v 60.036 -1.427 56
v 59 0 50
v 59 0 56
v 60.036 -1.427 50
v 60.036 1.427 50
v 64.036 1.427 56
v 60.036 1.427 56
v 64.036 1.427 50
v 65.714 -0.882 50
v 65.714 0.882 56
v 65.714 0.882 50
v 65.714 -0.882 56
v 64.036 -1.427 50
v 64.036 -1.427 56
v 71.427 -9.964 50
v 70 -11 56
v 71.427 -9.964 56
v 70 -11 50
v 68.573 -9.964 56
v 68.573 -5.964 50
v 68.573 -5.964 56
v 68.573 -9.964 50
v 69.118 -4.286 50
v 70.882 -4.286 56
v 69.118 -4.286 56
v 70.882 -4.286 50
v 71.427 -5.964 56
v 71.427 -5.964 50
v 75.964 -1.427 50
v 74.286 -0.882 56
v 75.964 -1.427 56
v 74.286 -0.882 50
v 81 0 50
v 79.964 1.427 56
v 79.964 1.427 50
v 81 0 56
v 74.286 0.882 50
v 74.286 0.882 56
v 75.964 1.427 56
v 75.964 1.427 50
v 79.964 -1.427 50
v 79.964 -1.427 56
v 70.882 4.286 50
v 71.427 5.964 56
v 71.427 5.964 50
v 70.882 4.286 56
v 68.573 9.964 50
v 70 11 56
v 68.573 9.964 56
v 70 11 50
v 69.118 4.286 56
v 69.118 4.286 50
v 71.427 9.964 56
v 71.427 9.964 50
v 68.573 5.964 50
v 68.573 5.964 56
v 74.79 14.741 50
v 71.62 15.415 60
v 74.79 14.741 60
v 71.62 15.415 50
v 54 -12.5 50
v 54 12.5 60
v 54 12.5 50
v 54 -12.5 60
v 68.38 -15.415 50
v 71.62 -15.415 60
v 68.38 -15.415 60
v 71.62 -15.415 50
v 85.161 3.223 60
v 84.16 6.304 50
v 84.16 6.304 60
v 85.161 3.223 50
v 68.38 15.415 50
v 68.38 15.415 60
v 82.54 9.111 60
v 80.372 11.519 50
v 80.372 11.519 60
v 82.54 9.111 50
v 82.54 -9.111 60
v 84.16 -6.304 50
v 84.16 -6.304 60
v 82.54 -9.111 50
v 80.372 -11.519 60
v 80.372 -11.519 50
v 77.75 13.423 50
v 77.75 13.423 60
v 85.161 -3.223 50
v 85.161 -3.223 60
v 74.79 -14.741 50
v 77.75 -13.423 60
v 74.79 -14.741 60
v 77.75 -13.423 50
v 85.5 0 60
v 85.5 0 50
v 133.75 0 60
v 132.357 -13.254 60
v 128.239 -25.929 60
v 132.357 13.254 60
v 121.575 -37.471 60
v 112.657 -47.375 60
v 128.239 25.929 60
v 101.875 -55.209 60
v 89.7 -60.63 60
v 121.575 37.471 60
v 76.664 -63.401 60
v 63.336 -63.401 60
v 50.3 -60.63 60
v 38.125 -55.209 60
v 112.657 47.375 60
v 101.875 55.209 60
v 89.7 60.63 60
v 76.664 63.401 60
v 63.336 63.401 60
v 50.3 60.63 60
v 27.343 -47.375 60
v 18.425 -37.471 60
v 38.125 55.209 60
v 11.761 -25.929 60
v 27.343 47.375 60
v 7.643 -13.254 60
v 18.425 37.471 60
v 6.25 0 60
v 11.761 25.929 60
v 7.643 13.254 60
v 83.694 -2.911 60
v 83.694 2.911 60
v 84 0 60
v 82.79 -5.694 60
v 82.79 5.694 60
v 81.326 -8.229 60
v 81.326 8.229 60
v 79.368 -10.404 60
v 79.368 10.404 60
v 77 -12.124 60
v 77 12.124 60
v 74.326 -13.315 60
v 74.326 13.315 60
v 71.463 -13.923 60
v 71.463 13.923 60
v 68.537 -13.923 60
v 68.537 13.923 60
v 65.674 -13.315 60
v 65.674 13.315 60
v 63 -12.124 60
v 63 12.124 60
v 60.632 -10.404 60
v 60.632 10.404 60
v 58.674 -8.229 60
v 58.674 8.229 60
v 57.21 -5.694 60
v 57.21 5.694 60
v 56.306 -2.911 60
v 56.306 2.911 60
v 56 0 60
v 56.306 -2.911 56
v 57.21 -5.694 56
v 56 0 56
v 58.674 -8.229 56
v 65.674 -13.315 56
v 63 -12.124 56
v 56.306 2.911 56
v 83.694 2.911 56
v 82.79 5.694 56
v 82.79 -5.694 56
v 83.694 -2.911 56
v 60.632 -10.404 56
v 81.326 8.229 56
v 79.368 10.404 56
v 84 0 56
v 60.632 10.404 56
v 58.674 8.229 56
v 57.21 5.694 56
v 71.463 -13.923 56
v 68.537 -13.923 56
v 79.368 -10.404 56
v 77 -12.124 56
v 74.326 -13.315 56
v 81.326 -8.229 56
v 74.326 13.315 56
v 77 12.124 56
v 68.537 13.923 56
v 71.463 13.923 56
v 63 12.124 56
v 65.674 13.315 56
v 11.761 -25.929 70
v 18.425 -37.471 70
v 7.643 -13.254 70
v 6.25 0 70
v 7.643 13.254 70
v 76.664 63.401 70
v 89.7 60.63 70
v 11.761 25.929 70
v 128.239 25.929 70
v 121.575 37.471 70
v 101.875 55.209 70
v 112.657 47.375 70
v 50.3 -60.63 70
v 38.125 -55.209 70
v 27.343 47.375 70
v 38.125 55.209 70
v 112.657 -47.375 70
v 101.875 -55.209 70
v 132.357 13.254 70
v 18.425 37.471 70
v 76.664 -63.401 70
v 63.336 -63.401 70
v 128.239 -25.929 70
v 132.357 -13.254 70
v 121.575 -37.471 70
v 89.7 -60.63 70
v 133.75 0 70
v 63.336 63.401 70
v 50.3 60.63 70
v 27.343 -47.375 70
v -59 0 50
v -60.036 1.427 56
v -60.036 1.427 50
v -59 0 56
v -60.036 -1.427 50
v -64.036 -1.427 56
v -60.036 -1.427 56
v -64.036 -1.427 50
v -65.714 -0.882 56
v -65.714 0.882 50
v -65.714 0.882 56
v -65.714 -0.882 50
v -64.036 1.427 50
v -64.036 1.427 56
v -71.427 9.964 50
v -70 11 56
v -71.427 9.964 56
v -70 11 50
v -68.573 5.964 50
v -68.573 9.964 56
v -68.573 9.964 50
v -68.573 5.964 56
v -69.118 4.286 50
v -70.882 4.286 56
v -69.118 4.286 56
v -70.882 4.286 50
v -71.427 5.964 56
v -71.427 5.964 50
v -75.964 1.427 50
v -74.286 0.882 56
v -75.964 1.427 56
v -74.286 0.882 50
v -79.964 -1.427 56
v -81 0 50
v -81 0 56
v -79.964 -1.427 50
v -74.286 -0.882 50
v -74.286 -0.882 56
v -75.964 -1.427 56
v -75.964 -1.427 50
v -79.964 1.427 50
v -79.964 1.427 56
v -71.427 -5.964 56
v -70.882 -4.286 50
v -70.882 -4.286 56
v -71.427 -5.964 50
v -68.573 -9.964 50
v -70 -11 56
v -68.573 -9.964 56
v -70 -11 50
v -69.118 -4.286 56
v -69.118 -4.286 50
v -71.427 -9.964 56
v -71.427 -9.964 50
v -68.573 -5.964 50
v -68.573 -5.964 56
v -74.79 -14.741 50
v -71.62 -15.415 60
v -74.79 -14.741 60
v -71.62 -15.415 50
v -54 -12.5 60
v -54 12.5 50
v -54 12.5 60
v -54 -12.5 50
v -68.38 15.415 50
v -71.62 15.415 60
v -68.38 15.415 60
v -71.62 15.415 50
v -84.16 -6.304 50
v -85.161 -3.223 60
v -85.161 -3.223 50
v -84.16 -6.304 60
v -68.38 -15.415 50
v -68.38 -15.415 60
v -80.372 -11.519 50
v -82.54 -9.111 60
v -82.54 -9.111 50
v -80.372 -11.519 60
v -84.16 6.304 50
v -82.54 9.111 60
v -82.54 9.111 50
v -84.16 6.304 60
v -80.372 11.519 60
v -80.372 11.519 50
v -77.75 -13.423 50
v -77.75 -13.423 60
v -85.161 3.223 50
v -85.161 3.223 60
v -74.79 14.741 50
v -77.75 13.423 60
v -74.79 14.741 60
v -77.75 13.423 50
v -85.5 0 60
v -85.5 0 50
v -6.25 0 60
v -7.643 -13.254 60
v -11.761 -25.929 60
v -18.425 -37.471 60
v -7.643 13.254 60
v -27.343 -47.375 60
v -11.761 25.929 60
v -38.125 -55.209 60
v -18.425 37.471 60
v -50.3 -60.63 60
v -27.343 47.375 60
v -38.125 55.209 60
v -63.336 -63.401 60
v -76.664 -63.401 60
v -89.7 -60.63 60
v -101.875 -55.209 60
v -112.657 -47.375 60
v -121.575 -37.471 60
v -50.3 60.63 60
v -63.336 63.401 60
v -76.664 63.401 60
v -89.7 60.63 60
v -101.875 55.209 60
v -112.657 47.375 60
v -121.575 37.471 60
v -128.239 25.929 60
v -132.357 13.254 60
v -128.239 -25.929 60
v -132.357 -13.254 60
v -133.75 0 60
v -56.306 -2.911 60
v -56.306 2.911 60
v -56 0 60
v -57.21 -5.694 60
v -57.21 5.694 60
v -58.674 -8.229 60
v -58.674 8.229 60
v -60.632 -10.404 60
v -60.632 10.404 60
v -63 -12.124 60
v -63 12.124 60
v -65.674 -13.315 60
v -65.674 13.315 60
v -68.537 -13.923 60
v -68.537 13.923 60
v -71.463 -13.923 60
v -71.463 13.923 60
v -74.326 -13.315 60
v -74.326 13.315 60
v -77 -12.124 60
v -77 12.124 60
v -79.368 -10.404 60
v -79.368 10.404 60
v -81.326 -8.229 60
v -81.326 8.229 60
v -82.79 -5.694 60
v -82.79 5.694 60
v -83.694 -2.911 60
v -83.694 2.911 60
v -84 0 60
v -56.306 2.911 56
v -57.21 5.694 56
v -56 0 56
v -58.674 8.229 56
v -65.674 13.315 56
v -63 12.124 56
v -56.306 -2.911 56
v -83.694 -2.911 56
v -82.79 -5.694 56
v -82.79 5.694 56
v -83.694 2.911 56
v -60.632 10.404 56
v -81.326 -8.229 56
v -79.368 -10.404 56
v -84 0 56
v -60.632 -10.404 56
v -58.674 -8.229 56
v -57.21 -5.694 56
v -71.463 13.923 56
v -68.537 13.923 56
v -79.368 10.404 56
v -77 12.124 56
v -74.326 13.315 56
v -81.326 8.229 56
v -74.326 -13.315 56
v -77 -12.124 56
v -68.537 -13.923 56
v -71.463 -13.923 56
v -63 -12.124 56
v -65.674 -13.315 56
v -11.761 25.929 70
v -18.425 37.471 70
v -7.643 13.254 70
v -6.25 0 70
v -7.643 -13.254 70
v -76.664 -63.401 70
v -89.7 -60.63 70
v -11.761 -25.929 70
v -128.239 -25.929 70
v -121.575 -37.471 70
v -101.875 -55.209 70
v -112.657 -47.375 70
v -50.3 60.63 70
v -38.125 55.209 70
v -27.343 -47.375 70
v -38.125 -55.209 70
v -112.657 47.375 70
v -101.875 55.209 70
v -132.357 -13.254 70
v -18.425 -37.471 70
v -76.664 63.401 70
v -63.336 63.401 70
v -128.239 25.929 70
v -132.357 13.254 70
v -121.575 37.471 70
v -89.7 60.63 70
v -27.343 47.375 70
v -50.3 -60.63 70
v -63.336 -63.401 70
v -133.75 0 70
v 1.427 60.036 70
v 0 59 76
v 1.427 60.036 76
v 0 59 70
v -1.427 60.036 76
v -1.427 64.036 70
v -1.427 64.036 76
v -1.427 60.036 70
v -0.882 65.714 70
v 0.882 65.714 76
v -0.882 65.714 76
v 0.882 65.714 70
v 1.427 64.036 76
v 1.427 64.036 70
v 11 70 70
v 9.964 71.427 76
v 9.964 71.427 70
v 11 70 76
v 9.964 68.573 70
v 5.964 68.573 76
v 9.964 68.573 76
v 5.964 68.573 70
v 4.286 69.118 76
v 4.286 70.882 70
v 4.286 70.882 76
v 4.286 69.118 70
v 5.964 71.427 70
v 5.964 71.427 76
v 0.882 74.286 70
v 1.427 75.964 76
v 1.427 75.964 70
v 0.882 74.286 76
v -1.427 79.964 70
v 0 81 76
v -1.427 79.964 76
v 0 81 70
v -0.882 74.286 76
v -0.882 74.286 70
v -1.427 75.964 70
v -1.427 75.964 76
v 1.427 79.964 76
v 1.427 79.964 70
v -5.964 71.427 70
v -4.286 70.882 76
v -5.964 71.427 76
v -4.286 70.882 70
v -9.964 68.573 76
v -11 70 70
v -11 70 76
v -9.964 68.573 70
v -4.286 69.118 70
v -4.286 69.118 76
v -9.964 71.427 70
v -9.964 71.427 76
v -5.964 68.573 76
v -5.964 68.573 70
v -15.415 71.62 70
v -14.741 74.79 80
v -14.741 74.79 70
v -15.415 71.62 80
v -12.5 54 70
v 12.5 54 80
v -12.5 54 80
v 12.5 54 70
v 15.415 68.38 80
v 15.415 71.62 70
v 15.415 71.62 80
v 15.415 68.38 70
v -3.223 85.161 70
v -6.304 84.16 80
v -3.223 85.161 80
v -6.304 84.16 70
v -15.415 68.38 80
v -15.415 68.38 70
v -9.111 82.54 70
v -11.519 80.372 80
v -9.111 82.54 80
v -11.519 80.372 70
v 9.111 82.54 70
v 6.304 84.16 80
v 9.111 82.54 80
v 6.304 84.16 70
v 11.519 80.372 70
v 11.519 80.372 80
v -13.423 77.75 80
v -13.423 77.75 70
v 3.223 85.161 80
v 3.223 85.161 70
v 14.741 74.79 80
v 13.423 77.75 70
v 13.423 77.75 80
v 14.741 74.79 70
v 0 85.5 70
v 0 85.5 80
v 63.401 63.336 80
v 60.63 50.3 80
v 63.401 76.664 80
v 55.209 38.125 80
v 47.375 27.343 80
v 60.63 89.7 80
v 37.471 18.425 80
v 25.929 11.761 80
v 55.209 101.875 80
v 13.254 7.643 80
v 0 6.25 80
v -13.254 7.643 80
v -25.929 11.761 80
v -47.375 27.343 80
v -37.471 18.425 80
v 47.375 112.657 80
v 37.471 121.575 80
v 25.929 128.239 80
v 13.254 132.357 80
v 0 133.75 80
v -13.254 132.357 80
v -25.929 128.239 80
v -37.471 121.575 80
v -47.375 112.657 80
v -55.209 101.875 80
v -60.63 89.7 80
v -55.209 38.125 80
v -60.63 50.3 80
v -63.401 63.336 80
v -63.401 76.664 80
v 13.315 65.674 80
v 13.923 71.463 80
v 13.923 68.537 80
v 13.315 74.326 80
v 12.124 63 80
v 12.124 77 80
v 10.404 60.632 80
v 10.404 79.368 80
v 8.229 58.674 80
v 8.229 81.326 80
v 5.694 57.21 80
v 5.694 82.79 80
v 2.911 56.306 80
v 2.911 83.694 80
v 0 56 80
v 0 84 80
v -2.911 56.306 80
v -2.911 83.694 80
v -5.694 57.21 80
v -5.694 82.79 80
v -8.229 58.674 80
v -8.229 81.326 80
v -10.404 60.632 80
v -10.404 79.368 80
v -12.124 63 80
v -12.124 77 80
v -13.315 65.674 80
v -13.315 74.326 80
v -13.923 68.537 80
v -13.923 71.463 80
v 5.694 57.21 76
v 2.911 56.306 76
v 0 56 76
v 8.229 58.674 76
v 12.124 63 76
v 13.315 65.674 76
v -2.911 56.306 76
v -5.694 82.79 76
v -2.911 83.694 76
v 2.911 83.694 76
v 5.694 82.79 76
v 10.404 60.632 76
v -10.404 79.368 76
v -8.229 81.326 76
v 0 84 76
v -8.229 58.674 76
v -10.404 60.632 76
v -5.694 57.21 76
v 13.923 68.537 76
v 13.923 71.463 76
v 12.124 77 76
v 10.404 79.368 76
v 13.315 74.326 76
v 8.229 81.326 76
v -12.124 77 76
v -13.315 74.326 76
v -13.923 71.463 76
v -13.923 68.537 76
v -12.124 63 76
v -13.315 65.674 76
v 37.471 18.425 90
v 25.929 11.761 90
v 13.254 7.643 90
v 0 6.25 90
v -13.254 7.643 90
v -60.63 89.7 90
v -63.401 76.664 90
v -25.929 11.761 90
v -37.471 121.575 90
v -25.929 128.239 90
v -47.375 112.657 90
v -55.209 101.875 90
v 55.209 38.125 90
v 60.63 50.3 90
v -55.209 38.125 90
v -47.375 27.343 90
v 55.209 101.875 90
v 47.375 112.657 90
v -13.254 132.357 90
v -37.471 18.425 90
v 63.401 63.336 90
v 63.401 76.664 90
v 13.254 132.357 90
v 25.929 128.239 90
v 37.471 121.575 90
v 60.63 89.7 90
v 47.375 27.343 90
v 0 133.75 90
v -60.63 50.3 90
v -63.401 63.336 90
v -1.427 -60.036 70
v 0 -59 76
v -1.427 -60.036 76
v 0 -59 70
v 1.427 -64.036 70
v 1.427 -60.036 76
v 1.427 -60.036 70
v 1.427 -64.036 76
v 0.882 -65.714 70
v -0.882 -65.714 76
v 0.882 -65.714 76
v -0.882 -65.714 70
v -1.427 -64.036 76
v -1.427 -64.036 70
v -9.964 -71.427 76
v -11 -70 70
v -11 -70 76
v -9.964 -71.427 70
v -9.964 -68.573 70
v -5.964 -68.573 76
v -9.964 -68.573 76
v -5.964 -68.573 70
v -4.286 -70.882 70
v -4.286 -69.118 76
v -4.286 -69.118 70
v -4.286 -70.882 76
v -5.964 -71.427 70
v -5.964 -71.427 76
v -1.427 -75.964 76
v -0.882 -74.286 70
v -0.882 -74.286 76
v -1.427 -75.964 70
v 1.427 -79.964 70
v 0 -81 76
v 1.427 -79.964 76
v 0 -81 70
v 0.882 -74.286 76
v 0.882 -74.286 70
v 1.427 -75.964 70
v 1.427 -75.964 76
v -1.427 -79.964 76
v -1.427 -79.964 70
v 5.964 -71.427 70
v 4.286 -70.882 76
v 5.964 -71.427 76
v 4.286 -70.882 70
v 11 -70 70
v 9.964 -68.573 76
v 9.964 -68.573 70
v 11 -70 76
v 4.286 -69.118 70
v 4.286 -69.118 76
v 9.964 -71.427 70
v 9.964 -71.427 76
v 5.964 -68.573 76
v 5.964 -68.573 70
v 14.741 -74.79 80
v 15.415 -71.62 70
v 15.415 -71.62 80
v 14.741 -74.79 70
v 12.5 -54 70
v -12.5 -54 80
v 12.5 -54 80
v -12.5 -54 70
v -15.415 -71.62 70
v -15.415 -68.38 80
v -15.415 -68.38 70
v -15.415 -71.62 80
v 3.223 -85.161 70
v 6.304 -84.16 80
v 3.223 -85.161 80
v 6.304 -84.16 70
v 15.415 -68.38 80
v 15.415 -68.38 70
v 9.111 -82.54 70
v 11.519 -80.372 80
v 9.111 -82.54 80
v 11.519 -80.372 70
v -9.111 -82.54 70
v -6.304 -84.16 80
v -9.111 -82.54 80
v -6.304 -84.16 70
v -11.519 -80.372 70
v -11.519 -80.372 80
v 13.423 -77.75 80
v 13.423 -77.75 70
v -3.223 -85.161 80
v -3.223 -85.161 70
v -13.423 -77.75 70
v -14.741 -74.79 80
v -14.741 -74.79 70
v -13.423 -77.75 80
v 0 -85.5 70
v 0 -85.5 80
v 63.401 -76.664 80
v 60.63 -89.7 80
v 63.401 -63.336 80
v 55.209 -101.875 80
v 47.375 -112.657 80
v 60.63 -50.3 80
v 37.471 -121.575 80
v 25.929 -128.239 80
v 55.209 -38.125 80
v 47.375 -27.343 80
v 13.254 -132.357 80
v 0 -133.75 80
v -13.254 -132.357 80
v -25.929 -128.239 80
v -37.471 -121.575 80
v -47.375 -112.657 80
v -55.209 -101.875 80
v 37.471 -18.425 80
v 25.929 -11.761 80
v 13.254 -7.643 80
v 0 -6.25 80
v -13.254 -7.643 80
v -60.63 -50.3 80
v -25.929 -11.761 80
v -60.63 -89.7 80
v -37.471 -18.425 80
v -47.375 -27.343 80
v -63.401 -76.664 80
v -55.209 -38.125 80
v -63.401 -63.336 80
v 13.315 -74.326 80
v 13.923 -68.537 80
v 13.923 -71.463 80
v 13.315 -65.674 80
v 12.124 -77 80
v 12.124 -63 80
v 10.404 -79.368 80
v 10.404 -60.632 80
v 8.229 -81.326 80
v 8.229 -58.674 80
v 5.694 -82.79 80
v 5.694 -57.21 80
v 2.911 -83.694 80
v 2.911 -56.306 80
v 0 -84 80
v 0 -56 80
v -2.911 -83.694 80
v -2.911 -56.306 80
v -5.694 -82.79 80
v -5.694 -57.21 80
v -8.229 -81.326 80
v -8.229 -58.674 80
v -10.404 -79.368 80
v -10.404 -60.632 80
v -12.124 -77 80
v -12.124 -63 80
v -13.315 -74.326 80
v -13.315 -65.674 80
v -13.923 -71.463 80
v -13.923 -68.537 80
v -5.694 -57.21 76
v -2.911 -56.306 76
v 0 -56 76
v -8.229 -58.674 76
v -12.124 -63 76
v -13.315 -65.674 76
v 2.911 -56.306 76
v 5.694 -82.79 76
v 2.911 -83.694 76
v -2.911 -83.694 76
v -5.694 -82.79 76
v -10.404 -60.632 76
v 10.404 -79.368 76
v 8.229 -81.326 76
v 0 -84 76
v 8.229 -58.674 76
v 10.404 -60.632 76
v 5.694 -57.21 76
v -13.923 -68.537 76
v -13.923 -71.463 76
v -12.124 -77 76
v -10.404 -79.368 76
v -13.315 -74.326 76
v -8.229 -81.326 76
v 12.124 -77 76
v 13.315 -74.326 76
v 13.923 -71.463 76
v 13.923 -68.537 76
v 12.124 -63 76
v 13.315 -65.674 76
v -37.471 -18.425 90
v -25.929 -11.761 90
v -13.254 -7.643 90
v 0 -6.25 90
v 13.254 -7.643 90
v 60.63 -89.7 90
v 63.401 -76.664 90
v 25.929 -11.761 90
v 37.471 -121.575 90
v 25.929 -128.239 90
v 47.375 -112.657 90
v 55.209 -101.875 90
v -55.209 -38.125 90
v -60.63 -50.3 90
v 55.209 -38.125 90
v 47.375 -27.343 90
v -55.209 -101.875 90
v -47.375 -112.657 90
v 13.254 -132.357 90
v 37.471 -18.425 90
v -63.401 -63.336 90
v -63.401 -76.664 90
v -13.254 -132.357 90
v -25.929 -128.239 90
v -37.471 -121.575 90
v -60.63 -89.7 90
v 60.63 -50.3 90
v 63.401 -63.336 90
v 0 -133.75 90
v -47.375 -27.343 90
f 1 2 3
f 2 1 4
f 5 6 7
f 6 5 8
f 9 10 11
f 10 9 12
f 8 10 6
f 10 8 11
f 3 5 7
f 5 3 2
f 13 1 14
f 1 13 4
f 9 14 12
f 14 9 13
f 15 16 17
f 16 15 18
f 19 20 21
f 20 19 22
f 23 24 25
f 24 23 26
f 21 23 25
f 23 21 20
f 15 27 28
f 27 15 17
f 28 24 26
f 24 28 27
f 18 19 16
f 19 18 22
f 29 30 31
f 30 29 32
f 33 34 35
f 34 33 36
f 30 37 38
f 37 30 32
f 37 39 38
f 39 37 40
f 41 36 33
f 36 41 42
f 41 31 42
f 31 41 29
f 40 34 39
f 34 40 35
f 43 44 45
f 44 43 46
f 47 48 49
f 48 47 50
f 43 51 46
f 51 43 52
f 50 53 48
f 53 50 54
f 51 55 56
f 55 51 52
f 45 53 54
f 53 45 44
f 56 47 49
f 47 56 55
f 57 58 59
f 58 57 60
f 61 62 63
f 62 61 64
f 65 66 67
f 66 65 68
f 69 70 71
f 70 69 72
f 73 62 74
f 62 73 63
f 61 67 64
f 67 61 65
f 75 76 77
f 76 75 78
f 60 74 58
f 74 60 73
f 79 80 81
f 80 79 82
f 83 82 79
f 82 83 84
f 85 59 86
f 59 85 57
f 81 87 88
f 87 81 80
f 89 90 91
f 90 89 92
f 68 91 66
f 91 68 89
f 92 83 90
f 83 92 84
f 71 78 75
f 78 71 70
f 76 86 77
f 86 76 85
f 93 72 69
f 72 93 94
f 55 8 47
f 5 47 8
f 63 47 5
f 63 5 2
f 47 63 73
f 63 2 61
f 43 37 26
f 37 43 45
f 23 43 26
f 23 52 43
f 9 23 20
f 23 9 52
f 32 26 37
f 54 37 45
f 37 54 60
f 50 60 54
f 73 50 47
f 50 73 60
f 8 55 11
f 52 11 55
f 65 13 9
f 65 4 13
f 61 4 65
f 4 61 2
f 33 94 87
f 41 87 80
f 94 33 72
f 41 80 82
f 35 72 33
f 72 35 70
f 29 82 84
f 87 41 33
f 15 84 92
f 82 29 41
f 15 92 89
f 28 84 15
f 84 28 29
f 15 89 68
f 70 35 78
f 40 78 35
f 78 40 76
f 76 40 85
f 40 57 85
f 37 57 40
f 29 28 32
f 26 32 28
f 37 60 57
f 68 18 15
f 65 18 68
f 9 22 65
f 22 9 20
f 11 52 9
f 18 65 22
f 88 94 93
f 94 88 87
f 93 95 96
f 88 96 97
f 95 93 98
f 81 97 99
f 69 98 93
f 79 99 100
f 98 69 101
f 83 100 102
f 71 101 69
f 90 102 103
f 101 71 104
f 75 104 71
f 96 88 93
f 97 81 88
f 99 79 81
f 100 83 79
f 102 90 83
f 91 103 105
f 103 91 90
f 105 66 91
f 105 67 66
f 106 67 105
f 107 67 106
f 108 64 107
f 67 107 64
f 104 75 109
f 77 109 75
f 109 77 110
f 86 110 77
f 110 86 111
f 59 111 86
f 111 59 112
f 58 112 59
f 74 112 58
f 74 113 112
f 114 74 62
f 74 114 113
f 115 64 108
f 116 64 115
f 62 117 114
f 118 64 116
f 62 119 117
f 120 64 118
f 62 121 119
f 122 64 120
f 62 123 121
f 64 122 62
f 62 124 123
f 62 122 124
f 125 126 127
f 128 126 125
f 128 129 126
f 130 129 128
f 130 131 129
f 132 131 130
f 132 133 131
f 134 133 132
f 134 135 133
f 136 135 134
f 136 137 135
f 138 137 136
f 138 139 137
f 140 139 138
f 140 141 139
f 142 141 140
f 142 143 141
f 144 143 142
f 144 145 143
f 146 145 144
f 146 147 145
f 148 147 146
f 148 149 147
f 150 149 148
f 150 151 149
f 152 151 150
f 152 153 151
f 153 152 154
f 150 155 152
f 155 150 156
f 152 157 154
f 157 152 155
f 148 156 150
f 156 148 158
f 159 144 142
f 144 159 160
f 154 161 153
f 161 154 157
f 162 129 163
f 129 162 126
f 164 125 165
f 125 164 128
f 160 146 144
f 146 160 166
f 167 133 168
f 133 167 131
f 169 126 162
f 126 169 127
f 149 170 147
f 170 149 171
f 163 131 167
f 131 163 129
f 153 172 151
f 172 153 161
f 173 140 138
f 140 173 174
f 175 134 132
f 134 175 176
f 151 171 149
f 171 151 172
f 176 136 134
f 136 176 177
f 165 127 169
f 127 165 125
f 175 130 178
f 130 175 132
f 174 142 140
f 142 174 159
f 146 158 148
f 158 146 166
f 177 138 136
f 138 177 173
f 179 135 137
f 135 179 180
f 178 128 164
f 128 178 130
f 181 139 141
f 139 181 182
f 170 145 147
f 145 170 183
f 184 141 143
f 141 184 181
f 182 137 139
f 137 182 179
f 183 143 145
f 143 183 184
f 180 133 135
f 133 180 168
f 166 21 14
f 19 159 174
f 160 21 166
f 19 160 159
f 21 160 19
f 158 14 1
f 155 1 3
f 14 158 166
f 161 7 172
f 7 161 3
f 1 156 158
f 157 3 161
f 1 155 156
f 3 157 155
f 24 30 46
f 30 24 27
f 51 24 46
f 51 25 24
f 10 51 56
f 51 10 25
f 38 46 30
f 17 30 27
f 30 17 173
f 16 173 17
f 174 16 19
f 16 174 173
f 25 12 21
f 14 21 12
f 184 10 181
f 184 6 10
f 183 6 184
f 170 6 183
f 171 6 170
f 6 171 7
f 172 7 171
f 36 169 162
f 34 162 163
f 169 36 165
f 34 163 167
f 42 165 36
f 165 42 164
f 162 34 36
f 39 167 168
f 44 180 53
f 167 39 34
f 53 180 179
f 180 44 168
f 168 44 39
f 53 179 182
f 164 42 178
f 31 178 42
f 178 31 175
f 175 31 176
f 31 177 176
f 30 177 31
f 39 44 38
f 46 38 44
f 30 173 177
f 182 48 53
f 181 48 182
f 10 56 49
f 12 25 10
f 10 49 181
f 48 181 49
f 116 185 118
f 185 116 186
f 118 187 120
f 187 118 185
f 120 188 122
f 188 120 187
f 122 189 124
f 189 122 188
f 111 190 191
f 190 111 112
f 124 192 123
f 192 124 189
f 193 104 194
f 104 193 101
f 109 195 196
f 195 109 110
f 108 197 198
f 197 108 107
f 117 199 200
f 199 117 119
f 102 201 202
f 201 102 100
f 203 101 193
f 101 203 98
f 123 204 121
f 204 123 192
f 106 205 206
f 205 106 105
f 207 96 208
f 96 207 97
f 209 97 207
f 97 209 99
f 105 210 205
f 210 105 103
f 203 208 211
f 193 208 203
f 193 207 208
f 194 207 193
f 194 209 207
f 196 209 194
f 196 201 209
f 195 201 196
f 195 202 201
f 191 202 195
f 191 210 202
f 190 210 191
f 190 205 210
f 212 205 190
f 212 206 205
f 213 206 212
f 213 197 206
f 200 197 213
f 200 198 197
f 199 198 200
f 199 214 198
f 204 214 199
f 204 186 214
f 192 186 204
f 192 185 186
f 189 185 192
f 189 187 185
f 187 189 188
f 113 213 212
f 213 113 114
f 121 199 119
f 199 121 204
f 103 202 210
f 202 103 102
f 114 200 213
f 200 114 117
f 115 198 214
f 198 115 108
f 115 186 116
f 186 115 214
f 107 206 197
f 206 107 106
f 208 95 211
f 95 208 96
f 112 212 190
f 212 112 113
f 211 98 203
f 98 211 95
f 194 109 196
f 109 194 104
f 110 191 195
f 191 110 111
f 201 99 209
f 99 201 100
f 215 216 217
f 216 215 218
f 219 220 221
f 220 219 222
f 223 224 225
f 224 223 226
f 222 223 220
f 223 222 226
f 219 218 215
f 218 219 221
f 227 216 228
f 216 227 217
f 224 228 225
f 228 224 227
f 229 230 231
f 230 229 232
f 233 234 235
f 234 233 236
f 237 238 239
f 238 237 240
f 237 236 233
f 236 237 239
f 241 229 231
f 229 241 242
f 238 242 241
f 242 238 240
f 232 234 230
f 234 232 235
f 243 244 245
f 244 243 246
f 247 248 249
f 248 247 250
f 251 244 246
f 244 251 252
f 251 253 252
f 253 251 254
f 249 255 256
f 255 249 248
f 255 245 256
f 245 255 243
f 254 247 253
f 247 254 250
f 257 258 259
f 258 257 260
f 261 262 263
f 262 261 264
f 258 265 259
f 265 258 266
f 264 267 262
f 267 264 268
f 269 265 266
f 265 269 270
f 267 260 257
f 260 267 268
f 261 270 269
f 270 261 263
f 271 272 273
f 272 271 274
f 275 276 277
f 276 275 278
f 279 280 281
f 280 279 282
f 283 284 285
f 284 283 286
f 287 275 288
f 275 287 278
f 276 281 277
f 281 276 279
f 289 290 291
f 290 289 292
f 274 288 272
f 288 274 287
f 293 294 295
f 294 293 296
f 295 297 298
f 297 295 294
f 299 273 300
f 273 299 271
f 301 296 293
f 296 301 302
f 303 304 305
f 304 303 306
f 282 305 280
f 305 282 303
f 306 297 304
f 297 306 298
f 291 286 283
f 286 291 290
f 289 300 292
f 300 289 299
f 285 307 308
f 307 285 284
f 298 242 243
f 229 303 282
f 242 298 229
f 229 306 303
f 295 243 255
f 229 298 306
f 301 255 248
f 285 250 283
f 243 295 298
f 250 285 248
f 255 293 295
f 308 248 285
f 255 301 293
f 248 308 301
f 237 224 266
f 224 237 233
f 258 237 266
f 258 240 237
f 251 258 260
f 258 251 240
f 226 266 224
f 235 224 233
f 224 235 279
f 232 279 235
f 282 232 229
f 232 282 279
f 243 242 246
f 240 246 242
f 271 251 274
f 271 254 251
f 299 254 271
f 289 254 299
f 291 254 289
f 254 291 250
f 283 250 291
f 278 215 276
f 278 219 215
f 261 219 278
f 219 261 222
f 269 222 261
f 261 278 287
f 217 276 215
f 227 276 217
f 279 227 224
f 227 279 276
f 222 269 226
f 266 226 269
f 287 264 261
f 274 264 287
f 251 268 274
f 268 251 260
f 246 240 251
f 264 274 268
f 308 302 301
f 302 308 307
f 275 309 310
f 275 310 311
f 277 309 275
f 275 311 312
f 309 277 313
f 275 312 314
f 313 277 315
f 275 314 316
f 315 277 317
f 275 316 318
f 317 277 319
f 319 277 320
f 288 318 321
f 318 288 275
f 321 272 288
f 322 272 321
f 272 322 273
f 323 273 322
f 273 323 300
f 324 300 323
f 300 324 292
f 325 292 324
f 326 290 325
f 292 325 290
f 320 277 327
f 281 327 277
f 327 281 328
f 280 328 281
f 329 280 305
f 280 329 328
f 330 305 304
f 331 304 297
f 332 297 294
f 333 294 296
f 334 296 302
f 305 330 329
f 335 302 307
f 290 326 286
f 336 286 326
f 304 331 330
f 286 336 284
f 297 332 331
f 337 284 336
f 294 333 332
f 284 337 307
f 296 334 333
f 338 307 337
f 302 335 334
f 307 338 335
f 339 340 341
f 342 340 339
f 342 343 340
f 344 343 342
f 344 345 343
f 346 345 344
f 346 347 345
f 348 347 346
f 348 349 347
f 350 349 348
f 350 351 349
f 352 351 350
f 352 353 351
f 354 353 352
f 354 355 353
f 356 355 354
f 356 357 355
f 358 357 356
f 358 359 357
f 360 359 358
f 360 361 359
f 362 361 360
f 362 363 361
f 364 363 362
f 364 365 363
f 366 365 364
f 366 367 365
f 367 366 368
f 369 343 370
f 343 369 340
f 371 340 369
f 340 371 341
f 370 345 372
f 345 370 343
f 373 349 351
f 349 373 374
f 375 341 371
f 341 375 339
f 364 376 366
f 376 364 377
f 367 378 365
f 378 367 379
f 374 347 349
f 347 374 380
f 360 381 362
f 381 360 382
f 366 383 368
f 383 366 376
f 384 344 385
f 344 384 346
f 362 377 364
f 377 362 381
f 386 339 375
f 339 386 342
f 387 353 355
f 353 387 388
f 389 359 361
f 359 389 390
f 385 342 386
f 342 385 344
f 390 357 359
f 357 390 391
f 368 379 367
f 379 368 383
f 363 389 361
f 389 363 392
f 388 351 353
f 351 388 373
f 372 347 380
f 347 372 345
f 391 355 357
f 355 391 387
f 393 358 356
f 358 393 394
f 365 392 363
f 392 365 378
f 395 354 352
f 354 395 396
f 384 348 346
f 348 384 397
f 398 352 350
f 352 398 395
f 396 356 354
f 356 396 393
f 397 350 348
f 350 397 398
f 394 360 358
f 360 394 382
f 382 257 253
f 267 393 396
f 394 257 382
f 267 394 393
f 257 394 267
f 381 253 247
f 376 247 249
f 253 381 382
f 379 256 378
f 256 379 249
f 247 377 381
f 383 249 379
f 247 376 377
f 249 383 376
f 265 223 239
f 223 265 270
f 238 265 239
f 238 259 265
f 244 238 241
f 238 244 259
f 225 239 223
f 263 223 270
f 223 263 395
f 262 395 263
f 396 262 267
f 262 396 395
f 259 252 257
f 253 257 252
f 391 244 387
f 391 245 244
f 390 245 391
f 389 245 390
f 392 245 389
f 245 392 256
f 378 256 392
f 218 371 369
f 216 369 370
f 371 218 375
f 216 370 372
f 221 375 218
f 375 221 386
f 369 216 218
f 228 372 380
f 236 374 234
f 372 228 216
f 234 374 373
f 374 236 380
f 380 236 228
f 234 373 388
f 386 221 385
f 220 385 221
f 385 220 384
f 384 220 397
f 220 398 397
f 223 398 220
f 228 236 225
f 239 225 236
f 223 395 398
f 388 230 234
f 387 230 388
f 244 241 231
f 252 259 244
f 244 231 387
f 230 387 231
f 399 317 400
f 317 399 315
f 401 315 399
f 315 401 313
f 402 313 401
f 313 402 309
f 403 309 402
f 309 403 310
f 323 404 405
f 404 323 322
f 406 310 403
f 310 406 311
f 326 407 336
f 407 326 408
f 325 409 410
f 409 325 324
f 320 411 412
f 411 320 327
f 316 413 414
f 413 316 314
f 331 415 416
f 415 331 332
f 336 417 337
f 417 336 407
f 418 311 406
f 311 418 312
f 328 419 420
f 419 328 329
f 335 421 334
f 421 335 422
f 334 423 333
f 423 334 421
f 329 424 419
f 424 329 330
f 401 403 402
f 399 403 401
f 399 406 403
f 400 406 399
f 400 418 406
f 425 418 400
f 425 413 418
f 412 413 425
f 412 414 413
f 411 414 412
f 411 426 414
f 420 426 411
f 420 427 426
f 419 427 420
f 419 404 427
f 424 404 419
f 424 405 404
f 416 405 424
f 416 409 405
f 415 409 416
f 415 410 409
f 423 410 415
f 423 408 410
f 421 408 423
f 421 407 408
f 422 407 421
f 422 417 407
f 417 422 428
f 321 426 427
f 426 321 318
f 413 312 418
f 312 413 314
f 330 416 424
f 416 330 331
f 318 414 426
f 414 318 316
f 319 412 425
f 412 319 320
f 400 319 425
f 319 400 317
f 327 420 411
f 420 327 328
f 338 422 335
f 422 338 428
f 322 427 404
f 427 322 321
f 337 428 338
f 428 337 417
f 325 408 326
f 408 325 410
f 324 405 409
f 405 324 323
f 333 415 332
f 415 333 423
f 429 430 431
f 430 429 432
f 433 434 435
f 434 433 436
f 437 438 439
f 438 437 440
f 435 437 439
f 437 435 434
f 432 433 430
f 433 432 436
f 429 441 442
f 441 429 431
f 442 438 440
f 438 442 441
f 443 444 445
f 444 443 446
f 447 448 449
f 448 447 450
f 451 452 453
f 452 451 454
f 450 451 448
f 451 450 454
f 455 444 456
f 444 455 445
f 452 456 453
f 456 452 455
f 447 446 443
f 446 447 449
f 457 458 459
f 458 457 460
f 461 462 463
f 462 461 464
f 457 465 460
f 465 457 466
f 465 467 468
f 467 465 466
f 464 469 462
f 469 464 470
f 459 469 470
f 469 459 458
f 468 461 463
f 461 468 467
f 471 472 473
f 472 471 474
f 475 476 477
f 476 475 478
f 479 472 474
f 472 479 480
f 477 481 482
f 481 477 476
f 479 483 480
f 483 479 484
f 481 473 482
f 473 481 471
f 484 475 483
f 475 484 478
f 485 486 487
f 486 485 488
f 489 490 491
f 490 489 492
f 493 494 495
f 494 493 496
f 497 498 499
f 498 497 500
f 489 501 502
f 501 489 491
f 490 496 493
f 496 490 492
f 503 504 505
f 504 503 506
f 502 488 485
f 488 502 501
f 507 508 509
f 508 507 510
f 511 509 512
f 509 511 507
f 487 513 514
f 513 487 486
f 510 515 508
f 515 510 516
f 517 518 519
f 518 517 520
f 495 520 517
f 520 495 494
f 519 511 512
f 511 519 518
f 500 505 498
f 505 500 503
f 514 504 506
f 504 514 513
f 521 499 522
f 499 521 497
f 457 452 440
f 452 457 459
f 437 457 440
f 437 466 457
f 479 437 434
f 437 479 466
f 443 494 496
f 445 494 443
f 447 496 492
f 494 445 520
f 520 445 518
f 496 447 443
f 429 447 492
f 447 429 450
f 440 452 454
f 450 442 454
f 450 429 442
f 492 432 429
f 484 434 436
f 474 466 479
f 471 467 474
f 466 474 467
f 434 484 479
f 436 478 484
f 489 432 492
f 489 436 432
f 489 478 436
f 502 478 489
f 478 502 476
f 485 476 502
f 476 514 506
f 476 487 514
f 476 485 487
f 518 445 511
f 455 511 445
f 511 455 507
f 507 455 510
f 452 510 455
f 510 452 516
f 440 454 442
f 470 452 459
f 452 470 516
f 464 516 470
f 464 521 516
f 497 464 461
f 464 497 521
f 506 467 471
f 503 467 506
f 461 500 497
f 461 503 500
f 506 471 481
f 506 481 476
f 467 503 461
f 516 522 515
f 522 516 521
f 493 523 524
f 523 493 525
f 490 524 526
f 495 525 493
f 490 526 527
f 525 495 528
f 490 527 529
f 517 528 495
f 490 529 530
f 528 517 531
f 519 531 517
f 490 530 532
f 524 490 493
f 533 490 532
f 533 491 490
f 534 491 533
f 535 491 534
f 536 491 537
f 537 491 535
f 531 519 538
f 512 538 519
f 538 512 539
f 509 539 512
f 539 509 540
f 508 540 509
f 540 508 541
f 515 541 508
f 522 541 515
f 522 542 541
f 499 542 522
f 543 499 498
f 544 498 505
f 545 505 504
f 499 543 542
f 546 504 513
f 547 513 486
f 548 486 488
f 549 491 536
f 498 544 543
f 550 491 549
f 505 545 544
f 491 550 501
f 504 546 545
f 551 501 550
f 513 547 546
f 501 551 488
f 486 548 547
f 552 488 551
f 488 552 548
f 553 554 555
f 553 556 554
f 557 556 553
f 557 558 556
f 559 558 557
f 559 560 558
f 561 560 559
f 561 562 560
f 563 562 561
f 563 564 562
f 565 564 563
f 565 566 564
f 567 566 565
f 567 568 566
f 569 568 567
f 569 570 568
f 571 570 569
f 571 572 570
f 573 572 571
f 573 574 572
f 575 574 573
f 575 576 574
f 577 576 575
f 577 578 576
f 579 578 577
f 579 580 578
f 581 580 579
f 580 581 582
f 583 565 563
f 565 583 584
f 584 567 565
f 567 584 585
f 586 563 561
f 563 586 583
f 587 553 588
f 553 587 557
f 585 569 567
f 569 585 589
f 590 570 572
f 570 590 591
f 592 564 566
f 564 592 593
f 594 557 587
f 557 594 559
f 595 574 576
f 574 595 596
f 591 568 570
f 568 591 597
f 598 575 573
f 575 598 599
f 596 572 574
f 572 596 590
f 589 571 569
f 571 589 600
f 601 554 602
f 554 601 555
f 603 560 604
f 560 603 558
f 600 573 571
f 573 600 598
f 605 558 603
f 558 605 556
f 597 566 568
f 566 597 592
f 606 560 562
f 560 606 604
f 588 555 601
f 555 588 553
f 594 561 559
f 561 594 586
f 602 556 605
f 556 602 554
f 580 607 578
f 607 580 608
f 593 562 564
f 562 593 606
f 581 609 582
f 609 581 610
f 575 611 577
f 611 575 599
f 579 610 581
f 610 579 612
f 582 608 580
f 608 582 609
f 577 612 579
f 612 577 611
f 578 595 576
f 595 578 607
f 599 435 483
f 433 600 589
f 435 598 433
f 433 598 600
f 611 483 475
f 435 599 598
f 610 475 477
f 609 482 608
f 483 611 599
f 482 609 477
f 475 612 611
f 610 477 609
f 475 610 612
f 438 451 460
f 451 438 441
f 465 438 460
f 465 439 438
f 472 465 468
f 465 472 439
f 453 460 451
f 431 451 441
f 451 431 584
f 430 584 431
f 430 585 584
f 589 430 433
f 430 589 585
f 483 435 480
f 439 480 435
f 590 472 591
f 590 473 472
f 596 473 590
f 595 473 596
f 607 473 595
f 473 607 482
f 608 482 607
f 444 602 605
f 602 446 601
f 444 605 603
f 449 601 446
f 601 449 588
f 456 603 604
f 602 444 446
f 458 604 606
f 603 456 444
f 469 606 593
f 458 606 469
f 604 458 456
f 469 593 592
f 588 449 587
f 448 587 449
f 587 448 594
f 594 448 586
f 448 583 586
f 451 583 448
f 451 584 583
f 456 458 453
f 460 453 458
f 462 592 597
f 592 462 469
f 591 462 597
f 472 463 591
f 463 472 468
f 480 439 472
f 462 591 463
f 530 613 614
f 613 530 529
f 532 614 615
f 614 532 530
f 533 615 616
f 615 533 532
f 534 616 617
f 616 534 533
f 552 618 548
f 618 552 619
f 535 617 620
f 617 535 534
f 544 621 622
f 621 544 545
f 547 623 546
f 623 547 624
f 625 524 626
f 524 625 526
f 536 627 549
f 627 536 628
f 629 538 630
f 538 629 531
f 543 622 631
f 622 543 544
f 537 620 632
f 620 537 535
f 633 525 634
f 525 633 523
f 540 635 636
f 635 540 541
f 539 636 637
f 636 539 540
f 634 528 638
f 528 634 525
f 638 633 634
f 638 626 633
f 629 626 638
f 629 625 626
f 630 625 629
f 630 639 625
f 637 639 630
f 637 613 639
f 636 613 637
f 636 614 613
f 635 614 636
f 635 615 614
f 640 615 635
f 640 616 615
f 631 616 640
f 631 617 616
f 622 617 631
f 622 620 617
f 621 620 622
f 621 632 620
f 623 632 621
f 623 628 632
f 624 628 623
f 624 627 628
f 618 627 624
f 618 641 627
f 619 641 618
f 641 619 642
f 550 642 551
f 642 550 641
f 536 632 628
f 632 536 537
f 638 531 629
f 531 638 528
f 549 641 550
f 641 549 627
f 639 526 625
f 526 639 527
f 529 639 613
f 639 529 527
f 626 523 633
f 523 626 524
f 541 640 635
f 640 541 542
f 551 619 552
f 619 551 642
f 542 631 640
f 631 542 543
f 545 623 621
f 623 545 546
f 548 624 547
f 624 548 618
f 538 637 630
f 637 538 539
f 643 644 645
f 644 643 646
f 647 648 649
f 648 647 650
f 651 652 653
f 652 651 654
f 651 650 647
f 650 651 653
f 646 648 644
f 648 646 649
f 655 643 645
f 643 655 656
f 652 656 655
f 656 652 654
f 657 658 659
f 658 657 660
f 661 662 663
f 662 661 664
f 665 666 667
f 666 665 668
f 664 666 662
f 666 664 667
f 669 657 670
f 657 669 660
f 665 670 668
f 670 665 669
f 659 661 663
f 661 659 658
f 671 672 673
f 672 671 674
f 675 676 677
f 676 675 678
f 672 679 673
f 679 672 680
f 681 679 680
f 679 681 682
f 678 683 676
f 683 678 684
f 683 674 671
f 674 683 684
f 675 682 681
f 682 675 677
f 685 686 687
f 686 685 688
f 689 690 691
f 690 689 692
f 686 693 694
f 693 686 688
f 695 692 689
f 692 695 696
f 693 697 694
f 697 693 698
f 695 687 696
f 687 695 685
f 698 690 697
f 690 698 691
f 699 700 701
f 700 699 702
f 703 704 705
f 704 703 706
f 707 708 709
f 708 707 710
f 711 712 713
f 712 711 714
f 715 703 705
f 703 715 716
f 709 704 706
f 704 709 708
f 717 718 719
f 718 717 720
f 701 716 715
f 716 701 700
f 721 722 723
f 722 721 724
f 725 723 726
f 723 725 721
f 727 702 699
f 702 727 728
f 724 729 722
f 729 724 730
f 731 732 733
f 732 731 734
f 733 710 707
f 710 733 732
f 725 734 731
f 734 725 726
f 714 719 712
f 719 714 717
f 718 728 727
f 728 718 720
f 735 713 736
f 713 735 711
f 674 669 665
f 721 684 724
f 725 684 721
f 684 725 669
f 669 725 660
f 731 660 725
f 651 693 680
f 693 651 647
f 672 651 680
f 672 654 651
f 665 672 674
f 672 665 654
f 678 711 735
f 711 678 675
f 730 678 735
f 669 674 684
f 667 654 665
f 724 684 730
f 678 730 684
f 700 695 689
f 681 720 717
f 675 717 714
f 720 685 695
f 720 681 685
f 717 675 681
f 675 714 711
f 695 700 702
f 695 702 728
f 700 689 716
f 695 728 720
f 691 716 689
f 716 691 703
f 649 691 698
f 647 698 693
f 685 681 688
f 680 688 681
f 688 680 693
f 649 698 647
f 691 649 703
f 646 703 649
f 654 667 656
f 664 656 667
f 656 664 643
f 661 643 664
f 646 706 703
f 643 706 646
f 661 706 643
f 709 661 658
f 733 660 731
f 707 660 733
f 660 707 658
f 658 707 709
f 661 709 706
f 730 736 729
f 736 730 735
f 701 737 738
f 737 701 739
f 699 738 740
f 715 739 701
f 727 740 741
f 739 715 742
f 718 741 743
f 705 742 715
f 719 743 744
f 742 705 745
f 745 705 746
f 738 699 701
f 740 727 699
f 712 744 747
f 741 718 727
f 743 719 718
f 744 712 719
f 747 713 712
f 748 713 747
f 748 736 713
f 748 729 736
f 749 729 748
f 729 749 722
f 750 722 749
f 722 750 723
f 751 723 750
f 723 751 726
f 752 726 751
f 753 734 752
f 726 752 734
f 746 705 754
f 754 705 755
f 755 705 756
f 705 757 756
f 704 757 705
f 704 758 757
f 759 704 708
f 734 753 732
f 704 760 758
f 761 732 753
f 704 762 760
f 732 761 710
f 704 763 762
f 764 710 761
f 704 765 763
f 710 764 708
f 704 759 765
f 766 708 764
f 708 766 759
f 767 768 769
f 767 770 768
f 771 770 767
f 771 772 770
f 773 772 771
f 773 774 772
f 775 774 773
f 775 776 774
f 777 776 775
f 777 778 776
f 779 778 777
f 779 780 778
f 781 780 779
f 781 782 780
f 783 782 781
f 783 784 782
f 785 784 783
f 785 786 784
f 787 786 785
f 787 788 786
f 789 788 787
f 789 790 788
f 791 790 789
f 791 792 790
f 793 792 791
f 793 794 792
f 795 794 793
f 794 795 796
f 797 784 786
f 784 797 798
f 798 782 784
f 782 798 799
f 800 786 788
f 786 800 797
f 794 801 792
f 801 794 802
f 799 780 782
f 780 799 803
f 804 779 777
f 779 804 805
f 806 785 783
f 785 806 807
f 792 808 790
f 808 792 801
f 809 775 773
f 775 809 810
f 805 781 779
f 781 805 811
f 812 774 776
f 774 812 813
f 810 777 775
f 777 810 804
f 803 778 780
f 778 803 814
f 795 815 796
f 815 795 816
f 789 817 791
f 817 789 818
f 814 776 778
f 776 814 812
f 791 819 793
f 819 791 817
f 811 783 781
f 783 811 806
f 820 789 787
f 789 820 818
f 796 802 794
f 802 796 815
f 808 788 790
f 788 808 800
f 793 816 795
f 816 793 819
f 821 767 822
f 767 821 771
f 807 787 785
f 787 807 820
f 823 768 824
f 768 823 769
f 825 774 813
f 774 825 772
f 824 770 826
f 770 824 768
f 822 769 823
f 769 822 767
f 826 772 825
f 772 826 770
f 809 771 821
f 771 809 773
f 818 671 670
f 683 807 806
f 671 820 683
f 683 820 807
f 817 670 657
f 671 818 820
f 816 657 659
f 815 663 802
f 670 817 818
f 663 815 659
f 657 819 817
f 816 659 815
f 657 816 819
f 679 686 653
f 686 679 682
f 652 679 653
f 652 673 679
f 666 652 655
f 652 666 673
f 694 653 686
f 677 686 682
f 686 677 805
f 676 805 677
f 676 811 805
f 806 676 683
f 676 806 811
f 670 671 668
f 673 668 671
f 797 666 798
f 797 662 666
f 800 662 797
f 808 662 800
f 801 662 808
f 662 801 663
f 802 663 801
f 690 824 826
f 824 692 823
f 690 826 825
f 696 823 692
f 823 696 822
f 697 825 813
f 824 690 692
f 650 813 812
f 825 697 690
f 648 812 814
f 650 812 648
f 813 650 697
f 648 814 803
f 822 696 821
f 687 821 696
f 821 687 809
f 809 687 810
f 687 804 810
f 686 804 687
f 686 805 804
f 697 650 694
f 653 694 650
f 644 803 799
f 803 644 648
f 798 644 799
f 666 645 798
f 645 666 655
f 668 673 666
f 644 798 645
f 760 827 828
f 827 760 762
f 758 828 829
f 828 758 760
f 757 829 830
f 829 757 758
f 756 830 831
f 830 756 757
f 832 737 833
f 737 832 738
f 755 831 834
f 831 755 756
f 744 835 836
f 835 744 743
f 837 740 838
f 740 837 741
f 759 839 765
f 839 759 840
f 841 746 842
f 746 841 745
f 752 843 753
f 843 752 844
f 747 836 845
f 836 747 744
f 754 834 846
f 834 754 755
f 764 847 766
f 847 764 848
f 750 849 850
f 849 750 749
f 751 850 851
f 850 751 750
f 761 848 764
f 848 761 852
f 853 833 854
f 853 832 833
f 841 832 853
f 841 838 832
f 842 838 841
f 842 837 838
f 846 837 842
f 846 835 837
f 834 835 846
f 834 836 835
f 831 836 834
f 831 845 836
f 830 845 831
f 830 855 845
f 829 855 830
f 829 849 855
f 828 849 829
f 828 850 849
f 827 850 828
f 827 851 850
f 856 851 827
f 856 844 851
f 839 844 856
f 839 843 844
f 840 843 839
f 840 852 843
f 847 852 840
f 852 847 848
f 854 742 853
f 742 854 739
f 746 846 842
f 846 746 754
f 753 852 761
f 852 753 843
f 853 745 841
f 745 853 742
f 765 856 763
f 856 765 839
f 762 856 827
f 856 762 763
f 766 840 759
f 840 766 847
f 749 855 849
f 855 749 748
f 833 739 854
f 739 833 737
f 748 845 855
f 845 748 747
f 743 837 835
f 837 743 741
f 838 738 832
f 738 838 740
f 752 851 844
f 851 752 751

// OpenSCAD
servoWid = 26;
goodKKWid = 37;
holdWid = goodKKWid + 5 + servoWid;
rPiLen = 66;
rPiWid = 31;
servoLen = 63;
holdLen = rPiLen +5;
kkWid = 36;
motorBoltSpace = 14;
armWid = 25;
armLength = 110-armWid/2;   // Distance to center of motor mount
height = 15;
module kk() {
	cube([goodKKWid,goodKKWid,12]);
}
module kkHold() {
	difference() {
		translate([0,0,-(height - 12)])cube([holdWid,holdLen,height]);
		translate([-2.5+(goodKKWid*1.5),-1+(goodKKWid/2),2])rotate([0,0,90])kk();
        
	}
}

module attach(width,height) {
	difference() {
		translate([-width,0,0])cube([width,width,height]);
		translate([-(width/4)*3,width/4,-0.5])cube([width/2,width/2,height+1]);
	}
}
module PiServo() {
    difference() {
        translate([0,0,100])cube([75,75,5],center=true);
        translate([-15,0,103])cube([rPiWid,rPiLen,5], center=true);
        translate([15,0,103])cube([servoWid,servoLen,5], center=true);
        translate([34,34,50])cylinder(d=2.8,h=100);
        rotate([0,0,90])translate([34,34,50])cylinder(d=2.8,h=100);
        rotate([0,0,180])translate([34,34,50])cylinder(d=2.8,h=100);
       rotate([0,0,-90])translate([34,34,50])cylinder(d=2.8,h=100);
    }
}
module main() {
	kkHold();
	translate([0,holdLen/2-7.5,0])attach(15,5);
	translate([holdWid/2+7.5,-15,0])attach(15,5);
	translate([holdWid+15,holdLen/2-7.5,0])attach(15,5);
	translate([holdWid/2+7.5,holdLen,0])attach(15,5);
}

armH = 10;
module arm() {
	difference() {
		translate([-armLength+armWid,0,0])cube([armLength,armWid,armH]);
		translate([armWid/2.5,armWid/5,-1])cube([16,15,6]);
		translate([13.75,35/4,-0.5])cube([15/2,15/2,15+1]);
	}
     translate([-armLength+armWid/2, armWid/2, 0]) motor_mount();
}


/*
    The motor mount. Cylinder with slots for the motor bolts. This 
    is done because the motor mounting holes are not on a square
*/
motorD = 28;
motorR = motorD/2;
holeR = 1.5;

module slot() {
    hull() {
        cylinder(r=holeR, h=100, center=true);
        translate([4,0,0]) cylinder(r=holeR, h=100, center=true);
    }
}

module motor_base() {
   hull() {
       cylinder(r = motorR+1.5, h=armH);
       translate([motorR+1, -armWid/2,0]) cube([1,armWid,armH]);
   }
}

module motor_mount() {
    difference() {
        motor_base();
        translate([0,0,6]) cylinder(r= motorR, h=7);
        for(angle = [0 : (360/4) : 360]) {
            rotate(angle) translate([5.5,0,0]) slot();
        }
    }
	#translate([0,0,10])cylinder(d=127.5, h=10);
}
UltraWid = 50;
UltraLen = 20;
module ultraBottom() {
    rotate([0,0,45])translate([10,-UltraWid/2,-15])cube([UltraLen,UltraWid,10]);
}
//translate([-25,holdLen/2-12.5,0])arm();
//main();
module newMain() {
    difference() {
        cube([130,130,height], center=true);
        //corners that are cut
        rotate([0,0,45])translate([-110,0,-1])cube([100,100,20],center = true);
        rotate([0,0,45])translate([110,0,-1])cube([100,100,20],center=true);
        rotate([0,0,90])union() {
            rotate([0,0,45])translate([-110,0,-1])cube([100,100,20],center = true);
            rotate([0,0,45])translate([110,0,-1])cube([100,100,20],center=true);
         }
        //KK mini holder
       rotate([0,0,45])translate([-holdWid/2,-holdLen/2,0])kkHold();
//         Holes for 2.75mm bolts
       rotate([0,0,45])translate([34,34,-50])cylinder(d=2.8,h=100);
        rotate([0,0,135])translate([34,34,-50])cylinder(d=2.8,h=100);
        rotate([0,0,225])translate([34,34,-50])cylinder(d=2.8,h=100);
        rotate([0,0,-45])translate([34,34,-50])cylinder(d=2.8,h=100);
         translate([0,0,6]) cylinder(r= motorR, h=7);
        translate([0,0,6]) cylinder(r= motorR, h=7);
        translate([0,0,6]) cylinder(r= motorR, h=7);
         // Extra motor holes
        rotate([0,0,-45])translate([0,69.5,-1.5]) cylinder(r= motorR, h=10);
         rotate([0,0,45])translate([0,69.5,-1.5]) cylinder(r= motorR, h=10);
         rotate([0,0,135])translate([0,69.5,-1.5]) cylinder(r= motorR, h=10);
         rotate([0,0,225])translate([0,69.5,-1.5]) cylinder(r= motorR, h=10);
          ultraBottom();
         //Difference ending
     }
     //motor mounts
    rotate([0,0,45])translate([-70,0,-7.5])motor_mount();
        rotate([0,0,225,])translate([-70,0,-7.5])motor_mount();
        rotate([0,0,90])union() {
            rotate([0,0,45])translate([-70,0,-7.5])motor_mount();
            rotate([0,0,225])translate([-70,0,-7.5])motor_mount();
         }
         //Can pick up thing
//         difference() {
//            translate([0,0,-50])cylinder(d=57,h=50);
//             translate([0,0,-51])cylinder(d=54,h=50);
//         }
}

module newNewMain() {
	for(angle = [0 : (360/2) : 360]) {
       rotate(angle)translate([70,0,50])rotate([0,0,180])motor_mount();
   }
	for(angle = [0 : (360/2) : 360]) {
       rotate(angle+360/4)translate([70,0,70])rotate([0,0,180])motor_mount();
   }
}
newNewMain();
//newMain();
//PiServo();
//prop size
//for(angle = [0 : (360/4) : 360]) {
//   #rotate(angle)translate([70,0,10])cylinder(d=127.5, h=10);
//}
//Boundry cylinder
//#cylinder(d=270,h=270);
